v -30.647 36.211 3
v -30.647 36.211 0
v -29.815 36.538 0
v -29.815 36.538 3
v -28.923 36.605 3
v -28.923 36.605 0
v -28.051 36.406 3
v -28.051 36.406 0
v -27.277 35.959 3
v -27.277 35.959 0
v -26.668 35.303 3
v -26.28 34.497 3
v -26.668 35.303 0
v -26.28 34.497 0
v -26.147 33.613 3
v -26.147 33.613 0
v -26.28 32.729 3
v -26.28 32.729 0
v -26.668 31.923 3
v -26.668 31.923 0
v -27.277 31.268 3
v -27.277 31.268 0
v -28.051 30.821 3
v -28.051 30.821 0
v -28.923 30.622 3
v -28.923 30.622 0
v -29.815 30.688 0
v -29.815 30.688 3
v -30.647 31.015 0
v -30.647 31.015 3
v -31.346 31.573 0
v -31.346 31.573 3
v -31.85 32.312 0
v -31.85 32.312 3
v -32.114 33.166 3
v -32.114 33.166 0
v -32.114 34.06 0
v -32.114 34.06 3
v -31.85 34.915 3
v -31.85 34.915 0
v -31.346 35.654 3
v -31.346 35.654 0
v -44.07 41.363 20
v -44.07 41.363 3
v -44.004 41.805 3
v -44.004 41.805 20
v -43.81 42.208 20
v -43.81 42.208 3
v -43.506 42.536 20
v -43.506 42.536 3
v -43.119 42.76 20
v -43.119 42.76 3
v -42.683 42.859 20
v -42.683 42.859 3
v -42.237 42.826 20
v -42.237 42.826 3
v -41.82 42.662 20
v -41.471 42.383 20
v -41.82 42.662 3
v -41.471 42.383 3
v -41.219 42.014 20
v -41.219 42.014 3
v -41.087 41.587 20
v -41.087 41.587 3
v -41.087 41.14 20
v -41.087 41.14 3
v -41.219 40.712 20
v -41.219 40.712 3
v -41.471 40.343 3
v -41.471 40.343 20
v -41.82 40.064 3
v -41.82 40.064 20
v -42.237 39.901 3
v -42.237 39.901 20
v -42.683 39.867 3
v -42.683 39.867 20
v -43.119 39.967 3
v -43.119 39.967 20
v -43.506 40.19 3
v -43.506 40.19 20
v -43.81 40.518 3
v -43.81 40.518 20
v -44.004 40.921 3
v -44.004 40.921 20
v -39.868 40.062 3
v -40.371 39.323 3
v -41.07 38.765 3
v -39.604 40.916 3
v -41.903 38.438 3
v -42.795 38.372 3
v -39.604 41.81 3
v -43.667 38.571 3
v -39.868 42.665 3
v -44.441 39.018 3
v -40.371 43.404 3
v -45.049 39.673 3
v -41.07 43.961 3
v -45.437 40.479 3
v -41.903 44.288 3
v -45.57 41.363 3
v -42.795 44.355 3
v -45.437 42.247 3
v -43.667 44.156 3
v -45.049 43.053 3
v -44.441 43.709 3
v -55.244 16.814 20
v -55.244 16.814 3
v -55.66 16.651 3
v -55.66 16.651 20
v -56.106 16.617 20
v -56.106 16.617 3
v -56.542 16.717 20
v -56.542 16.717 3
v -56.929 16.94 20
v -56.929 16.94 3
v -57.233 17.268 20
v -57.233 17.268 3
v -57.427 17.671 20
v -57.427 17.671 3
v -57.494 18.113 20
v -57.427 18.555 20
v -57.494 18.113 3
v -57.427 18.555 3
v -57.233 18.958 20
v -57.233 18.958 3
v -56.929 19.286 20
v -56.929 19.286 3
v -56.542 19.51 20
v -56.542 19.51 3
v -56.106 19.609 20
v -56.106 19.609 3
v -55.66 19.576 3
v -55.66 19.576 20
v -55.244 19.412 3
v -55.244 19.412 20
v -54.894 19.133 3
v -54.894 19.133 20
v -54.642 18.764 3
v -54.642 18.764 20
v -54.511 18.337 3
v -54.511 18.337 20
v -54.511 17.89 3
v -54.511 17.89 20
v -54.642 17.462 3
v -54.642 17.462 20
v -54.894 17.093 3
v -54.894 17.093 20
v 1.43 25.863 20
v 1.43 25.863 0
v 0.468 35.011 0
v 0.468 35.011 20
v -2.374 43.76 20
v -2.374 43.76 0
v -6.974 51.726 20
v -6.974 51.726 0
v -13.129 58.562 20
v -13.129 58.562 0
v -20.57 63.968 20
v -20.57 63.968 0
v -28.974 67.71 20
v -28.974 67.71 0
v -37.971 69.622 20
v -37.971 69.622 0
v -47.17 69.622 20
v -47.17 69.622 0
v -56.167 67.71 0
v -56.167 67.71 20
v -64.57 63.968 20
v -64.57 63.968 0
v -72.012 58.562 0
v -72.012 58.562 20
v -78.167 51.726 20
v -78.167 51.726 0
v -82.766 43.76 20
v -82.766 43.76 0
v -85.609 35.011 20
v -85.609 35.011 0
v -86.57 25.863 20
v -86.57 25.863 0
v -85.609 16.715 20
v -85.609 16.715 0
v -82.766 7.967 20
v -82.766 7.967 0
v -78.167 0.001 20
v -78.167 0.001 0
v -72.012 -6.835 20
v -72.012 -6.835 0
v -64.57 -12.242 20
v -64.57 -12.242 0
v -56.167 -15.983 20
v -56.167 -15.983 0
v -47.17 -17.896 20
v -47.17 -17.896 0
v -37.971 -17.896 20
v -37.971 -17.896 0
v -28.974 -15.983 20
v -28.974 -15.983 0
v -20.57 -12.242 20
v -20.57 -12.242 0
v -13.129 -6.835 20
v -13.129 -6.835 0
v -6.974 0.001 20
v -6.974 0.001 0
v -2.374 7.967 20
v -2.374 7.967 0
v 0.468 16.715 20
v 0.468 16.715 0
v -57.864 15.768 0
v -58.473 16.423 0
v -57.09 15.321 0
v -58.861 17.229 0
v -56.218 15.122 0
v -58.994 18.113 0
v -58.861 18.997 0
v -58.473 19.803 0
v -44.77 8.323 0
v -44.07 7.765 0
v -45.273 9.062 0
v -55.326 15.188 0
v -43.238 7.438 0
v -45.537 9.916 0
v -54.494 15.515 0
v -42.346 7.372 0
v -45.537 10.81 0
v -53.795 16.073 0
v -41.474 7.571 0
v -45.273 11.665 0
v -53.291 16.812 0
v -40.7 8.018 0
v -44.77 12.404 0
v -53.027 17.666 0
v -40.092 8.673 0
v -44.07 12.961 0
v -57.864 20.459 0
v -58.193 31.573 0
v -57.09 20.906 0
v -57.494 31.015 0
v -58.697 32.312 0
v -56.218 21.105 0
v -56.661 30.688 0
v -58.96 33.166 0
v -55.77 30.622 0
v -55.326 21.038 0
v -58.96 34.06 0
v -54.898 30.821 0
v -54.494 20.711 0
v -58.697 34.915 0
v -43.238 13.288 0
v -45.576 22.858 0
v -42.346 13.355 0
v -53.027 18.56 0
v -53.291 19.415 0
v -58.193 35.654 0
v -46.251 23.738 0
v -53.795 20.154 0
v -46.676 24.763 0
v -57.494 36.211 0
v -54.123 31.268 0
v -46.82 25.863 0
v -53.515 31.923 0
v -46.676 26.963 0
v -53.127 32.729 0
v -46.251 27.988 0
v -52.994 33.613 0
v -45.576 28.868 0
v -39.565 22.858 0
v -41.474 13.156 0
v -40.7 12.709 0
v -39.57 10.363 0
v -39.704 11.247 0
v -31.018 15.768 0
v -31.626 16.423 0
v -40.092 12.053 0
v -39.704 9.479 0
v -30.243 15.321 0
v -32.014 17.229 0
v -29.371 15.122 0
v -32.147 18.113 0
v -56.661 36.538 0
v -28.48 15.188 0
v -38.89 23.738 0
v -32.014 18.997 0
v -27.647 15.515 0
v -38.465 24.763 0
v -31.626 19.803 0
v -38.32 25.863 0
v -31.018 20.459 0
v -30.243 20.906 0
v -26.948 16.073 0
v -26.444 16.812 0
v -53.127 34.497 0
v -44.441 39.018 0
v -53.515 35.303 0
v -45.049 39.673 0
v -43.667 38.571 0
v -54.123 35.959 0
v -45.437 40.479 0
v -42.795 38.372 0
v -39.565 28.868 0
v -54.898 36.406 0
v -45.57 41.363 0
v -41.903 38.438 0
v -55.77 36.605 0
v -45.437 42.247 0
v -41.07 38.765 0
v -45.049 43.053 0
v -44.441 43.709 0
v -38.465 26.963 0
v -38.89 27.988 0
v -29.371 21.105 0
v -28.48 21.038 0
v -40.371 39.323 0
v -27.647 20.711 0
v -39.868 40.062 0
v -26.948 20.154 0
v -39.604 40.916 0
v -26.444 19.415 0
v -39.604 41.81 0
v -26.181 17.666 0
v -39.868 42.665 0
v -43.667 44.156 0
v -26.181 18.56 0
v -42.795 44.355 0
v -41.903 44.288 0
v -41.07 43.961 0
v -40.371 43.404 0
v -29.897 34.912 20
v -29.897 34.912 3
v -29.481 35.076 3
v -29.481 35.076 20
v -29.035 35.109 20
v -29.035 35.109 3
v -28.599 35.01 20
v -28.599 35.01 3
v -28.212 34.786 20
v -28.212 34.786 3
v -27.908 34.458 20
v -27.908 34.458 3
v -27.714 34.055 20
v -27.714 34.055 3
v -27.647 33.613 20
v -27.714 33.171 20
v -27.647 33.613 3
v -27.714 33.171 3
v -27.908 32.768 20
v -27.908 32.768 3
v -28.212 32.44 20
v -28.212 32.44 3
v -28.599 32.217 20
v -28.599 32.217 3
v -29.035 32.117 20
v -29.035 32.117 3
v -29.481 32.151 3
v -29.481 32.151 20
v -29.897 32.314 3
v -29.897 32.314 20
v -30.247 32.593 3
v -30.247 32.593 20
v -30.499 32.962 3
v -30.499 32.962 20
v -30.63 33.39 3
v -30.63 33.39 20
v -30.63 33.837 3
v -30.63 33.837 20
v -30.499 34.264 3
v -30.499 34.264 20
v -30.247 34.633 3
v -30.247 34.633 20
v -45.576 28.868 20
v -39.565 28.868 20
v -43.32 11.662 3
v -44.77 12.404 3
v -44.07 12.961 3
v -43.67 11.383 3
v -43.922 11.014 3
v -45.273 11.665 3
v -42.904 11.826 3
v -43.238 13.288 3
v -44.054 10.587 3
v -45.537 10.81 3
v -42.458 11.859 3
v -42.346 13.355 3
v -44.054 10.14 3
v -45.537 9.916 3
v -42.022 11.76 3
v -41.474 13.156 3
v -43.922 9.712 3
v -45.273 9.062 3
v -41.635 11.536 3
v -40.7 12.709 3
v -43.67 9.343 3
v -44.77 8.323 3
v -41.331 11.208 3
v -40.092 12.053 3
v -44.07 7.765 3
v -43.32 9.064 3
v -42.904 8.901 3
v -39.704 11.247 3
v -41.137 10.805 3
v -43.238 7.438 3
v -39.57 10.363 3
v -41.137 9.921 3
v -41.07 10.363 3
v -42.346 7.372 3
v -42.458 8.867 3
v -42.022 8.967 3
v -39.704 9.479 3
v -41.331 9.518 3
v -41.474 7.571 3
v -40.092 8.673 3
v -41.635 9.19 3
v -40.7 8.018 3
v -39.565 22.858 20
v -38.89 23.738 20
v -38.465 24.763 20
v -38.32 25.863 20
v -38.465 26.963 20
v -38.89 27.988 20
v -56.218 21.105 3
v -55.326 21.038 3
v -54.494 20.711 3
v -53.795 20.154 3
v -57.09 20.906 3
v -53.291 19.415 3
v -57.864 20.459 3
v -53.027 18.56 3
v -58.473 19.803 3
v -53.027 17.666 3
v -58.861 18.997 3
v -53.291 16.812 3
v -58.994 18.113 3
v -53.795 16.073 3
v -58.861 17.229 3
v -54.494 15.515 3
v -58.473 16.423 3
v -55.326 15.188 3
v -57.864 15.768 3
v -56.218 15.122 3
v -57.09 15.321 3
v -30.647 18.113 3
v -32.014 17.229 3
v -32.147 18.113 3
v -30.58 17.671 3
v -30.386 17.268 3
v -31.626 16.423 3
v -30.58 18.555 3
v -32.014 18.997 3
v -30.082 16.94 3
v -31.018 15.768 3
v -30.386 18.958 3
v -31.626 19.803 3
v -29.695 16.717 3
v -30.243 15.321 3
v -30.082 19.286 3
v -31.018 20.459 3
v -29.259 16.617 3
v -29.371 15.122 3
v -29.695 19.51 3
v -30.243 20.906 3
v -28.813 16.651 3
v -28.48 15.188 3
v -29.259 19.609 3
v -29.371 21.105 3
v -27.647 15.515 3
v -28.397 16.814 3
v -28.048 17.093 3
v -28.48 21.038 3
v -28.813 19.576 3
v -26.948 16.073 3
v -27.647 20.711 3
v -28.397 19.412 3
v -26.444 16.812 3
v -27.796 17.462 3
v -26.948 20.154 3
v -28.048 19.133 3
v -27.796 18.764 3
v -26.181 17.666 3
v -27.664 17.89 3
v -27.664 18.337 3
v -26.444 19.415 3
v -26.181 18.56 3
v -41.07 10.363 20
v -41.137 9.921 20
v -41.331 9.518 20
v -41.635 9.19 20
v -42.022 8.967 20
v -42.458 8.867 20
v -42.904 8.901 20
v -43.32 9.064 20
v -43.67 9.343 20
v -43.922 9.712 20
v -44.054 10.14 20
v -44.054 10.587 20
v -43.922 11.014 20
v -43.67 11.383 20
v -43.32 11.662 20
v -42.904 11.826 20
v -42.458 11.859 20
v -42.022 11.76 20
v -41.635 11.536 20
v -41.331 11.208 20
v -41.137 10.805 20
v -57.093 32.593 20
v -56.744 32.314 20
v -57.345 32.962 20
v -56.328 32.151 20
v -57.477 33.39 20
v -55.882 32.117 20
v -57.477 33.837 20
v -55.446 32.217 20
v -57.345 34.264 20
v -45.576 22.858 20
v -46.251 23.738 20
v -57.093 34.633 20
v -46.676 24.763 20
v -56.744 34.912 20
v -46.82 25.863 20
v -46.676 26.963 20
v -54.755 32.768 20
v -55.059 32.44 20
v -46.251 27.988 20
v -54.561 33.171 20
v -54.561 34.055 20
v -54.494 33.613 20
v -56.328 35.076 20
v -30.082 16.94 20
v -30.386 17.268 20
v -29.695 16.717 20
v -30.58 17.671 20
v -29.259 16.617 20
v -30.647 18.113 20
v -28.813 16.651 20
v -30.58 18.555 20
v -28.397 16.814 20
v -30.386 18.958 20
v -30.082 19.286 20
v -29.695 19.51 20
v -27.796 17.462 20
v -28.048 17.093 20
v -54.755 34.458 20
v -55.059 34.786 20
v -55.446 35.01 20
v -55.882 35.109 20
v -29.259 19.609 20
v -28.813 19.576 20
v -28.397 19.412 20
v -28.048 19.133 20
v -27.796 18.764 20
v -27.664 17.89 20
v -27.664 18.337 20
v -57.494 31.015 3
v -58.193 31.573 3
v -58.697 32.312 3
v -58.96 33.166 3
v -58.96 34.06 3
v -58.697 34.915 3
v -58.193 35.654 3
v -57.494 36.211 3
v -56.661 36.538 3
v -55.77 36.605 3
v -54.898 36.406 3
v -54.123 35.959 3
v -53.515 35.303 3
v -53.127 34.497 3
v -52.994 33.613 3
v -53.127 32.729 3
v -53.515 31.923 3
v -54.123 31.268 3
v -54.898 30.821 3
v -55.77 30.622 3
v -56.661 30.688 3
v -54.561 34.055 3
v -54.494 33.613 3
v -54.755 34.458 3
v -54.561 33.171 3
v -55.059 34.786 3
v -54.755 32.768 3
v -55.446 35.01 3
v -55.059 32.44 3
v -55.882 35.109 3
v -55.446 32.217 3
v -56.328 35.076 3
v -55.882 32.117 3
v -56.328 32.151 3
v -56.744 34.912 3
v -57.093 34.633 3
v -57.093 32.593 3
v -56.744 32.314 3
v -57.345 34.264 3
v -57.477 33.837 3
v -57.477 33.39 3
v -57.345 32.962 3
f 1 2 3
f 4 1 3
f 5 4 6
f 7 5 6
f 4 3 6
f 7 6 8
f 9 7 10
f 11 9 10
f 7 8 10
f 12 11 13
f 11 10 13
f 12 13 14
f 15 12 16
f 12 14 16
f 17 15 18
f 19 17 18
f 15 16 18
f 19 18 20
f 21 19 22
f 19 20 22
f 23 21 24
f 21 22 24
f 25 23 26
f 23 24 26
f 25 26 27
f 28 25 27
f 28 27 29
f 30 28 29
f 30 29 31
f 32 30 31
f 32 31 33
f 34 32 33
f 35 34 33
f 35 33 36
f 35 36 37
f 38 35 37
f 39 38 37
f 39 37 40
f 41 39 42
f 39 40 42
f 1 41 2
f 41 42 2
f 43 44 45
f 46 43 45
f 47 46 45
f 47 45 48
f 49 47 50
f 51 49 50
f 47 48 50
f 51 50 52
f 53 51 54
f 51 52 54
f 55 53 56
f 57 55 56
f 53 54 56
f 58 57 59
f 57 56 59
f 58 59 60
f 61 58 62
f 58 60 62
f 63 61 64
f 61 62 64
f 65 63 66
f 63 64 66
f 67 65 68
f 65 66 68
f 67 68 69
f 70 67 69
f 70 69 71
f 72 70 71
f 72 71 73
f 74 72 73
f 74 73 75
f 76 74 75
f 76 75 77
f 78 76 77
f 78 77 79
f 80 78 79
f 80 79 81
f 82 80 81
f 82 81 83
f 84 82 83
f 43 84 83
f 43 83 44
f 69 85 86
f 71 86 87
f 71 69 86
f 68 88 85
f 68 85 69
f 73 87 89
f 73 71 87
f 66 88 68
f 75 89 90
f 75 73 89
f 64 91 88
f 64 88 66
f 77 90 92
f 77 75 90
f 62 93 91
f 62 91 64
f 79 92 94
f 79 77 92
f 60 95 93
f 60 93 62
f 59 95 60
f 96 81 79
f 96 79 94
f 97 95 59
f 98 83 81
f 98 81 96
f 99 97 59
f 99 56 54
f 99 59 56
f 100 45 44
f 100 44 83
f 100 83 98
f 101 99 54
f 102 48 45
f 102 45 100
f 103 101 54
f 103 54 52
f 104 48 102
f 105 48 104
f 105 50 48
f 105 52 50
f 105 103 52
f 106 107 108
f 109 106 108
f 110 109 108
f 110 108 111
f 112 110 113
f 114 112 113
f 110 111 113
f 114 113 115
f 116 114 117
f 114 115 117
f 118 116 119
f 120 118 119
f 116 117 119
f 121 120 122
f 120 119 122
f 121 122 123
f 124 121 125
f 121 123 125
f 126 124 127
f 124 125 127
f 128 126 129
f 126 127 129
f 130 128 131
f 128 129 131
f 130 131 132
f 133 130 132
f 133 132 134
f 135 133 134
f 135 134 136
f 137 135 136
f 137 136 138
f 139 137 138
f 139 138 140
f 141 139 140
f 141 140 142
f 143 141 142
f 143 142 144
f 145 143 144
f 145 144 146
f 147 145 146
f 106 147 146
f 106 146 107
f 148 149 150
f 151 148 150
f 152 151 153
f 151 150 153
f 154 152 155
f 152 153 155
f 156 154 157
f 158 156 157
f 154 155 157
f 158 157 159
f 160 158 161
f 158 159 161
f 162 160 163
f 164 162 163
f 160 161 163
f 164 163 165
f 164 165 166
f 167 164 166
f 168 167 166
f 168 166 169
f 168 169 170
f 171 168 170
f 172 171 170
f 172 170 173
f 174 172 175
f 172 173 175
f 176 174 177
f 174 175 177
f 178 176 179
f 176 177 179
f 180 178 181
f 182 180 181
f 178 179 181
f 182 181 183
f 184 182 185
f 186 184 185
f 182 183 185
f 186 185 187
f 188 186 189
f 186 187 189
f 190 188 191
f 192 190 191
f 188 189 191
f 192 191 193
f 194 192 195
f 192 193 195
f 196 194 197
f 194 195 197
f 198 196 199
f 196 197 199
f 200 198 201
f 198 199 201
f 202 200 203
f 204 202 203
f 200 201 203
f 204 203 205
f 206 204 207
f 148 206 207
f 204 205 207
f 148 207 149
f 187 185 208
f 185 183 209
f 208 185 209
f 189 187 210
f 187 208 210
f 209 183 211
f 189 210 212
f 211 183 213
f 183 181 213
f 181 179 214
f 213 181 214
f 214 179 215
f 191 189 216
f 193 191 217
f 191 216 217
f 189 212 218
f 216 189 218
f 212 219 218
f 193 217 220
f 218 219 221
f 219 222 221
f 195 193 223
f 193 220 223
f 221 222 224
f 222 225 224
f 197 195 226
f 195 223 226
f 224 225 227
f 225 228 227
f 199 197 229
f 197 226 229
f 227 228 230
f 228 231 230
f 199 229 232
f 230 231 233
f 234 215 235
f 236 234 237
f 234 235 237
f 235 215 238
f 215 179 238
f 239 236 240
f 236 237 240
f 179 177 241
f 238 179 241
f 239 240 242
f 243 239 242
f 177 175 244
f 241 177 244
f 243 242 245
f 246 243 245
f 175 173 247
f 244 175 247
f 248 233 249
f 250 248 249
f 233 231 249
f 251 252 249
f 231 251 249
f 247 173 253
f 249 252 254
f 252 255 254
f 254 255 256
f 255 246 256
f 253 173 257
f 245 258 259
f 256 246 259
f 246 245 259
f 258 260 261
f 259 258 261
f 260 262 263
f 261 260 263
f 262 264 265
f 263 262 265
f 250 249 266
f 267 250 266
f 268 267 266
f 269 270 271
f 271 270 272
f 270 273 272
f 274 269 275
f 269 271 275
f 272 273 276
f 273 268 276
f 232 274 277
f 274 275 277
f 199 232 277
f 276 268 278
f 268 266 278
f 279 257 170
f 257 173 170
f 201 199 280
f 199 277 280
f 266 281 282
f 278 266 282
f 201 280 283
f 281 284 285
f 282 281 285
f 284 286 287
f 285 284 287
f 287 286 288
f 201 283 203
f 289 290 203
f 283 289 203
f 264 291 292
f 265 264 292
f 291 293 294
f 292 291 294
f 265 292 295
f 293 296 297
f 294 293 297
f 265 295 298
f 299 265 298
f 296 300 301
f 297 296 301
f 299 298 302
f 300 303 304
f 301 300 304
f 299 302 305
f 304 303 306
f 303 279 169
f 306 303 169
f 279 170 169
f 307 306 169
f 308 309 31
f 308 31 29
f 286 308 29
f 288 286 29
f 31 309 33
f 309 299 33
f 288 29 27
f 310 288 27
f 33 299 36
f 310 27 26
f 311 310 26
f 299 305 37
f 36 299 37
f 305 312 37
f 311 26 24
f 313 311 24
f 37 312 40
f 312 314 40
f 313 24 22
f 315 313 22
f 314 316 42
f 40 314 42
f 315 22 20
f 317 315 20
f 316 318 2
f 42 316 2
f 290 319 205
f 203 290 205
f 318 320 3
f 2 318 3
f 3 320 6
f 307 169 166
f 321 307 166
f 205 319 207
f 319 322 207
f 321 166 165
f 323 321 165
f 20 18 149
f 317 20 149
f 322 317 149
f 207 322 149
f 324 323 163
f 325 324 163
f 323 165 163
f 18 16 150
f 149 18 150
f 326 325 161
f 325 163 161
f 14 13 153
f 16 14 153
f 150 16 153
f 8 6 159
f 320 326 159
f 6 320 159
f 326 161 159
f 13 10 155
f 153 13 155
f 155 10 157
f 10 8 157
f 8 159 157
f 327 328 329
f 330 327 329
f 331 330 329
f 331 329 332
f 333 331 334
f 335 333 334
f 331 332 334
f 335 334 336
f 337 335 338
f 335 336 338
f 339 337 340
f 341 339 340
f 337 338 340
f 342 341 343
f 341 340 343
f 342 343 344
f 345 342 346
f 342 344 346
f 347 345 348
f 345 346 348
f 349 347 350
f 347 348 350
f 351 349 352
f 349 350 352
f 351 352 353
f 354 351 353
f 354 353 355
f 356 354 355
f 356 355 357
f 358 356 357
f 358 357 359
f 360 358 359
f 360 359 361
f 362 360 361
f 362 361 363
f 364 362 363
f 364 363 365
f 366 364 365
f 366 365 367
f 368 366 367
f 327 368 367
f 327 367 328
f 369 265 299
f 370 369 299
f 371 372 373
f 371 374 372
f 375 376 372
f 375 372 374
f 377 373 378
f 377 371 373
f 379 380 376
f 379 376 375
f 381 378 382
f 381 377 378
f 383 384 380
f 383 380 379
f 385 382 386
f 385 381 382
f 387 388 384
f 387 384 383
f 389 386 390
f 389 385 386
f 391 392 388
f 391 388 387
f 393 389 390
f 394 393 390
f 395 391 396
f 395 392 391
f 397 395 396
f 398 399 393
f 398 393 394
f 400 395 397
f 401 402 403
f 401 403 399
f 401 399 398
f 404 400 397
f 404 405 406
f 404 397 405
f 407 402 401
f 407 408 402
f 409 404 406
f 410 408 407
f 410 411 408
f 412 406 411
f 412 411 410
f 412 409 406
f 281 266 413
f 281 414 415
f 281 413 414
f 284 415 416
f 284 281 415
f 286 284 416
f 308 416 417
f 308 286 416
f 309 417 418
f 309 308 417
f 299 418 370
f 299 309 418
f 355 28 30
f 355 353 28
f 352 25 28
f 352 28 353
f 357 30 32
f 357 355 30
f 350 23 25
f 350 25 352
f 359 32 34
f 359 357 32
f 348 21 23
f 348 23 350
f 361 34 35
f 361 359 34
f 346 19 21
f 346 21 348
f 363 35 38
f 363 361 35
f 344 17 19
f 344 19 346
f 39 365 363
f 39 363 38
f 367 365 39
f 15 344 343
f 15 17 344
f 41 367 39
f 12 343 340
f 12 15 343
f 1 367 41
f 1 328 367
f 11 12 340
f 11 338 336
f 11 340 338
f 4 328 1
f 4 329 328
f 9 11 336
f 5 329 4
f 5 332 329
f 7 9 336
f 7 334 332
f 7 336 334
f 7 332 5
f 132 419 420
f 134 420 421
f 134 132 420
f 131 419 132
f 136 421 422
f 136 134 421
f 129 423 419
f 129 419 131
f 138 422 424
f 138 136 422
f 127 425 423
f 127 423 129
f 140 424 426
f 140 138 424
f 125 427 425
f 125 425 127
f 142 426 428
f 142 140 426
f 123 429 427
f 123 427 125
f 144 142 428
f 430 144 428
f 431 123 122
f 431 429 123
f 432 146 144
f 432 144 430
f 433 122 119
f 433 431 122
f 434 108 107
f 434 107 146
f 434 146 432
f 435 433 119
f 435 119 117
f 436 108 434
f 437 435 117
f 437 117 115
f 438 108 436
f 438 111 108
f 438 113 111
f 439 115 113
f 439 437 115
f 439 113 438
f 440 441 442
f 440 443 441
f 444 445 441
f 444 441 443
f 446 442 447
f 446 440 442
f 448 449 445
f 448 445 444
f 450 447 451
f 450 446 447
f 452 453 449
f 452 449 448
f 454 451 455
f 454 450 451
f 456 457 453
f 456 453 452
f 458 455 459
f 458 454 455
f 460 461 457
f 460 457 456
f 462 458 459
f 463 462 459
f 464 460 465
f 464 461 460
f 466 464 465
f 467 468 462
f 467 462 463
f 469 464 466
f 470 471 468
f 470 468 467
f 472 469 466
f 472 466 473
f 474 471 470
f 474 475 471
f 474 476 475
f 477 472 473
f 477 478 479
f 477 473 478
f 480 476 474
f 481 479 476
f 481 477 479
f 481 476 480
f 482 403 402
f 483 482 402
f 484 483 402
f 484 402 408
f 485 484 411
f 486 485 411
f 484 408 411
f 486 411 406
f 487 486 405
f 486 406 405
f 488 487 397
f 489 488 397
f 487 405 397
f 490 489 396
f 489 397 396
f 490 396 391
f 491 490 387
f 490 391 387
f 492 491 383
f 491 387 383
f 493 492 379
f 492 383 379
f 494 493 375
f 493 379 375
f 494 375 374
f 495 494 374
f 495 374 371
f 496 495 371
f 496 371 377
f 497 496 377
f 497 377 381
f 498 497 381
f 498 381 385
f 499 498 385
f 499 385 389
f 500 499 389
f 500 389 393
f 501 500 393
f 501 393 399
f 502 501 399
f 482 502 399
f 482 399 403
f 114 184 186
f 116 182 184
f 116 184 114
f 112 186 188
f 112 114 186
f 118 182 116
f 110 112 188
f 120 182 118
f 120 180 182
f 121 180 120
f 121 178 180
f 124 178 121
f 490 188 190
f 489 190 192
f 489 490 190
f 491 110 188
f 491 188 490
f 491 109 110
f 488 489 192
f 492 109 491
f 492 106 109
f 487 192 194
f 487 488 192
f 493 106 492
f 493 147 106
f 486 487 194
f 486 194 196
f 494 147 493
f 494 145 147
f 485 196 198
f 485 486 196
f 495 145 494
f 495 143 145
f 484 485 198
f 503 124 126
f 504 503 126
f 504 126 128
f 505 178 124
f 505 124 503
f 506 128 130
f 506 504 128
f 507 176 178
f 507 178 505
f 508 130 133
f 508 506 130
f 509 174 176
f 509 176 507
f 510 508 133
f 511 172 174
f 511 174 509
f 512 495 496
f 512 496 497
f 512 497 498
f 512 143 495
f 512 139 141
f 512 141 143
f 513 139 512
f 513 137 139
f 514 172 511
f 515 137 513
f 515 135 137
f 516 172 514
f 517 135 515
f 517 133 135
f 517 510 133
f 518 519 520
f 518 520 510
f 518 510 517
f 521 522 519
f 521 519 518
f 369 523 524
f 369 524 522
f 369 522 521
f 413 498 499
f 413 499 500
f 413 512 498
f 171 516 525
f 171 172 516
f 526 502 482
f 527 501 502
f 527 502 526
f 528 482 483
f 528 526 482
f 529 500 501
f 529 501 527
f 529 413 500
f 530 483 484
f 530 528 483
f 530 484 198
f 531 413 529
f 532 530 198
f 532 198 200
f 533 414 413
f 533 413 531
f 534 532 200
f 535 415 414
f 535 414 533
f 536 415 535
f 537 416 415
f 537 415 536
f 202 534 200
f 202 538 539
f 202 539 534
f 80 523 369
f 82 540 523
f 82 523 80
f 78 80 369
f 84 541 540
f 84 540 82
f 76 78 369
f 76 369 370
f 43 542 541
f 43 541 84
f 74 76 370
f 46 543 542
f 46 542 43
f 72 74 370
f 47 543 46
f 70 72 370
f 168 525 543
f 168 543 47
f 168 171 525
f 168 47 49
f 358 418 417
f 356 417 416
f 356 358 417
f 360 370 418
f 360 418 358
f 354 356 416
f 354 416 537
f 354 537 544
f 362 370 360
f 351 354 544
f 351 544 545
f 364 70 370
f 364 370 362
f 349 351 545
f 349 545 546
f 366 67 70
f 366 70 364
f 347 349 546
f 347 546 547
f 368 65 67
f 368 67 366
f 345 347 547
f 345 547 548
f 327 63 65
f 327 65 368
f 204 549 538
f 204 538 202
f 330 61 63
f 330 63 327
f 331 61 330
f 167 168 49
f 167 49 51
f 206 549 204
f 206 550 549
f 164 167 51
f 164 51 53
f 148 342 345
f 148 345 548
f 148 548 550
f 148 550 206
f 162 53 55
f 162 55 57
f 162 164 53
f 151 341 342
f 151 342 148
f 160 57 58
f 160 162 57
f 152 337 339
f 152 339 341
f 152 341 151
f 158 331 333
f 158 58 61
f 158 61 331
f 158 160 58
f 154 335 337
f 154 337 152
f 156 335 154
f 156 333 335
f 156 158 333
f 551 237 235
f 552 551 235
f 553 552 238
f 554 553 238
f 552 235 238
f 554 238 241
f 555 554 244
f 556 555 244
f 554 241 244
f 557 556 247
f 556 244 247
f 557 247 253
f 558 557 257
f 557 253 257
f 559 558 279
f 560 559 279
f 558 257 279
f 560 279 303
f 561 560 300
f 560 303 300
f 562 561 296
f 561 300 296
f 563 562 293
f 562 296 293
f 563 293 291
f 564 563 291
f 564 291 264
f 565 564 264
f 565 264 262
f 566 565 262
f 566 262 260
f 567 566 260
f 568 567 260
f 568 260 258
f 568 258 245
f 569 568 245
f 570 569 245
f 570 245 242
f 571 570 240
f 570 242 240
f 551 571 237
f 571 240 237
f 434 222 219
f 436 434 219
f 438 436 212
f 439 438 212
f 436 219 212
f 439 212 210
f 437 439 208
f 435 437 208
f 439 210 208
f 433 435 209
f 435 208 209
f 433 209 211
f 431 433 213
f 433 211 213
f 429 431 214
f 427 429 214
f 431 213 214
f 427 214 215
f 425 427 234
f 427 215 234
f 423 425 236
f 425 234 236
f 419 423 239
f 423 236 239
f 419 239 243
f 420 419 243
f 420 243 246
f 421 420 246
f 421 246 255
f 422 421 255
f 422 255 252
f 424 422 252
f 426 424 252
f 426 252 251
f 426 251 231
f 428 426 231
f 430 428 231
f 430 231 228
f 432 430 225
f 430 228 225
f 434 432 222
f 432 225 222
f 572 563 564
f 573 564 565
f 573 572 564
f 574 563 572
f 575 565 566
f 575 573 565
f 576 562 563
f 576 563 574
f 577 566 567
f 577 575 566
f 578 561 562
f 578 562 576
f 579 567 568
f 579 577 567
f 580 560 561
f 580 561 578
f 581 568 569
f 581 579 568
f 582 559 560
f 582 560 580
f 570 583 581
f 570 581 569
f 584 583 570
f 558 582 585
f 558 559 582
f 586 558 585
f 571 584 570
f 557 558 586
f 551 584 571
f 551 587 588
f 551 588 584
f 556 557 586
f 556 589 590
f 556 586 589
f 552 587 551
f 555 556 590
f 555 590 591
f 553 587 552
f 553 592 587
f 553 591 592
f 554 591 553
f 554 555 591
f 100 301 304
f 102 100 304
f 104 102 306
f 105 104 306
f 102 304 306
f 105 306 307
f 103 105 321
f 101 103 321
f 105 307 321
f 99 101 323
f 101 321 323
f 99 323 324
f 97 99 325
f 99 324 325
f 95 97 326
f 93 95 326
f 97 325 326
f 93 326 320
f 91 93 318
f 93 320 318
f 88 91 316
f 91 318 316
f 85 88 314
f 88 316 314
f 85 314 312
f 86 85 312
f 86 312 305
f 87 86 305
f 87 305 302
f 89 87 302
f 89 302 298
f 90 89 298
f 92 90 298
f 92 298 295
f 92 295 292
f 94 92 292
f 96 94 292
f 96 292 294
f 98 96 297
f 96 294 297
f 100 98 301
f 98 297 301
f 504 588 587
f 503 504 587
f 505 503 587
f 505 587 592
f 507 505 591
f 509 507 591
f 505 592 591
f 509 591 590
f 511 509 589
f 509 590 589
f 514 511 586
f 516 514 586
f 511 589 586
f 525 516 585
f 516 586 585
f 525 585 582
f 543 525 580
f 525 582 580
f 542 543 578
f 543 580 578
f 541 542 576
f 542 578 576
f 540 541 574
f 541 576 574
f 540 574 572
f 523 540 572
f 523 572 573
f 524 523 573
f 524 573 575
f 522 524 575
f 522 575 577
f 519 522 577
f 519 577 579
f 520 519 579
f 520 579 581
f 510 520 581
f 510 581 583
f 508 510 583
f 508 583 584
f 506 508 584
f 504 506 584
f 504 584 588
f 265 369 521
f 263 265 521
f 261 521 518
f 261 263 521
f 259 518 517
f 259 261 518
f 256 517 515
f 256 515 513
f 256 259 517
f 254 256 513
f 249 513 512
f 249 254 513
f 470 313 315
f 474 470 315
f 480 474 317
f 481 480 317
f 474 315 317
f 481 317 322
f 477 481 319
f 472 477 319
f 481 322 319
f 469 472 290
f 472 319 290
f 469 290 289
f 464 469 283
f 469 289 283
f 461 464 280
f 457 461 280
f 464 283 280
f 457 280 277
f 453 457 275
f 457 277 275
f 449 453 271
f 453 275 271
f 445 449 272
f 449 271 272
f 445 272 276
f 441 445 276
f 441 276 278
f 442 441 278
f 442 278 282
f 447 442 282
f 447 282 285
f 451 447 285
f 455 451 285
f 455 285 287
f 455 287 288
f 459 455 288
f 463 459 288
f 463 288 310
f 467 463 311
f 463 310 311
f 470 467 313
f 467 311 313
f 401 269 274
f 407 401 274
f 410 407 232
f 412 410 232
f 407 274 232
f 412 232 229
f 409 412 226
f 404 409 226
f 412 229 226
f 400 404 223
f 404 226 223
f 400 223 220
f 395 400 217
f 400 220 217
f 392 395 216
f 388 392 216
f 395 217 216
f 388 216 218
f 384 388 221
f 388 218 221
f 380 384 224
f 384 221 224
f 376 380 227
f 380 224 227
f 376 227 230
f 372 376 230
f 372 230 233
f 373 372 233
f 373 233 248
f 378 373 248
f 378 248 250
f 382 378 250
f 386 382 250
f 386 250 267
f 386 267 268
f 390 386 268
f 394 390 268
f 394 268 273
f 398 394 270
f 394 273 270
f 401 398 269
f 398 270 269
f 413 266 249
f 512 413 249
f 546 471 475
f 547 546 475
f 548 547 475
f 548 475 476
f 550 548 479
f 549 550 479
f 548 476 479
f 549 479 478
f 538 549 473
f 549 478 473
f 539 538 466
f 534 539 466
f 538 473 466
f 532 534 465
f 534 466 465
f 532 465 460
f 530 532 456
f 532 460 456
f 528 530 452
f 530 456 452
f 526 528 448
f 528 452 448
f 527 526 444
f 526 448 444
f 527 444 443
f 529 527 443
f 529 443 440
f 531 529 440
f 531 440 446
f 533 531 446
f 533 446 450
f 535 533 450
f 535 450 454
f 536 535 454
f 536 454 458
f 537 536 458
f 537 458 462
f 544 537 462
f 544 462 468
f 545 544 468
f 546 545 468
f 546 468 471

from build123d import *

# Parameters (mm, degrees)
SKETCH1_R           = 44
BOSS_EXTRUDE1_DEPTH = 20
SKETCH2_R           = 1.5
CUT_EXTRUDE1_DEPTH  = 114.02795241
SKETCH2_3_R         = 3
CUT_EXTRUDE2_DEPTH  = 3
CIRPATTERN1_COUNT   = 6


with BuildPart() as part:
    # Sketch1 → Boss-Extrude1 (new body)
    with BuildSketch(Plane.XY):
        with Locations((-42.570496177, 25.863203603)):
            Circle(SKETCH1_R)
        with BuildLine():
            Line((-39.565292357, 22.857999783), (-45.575699997, 22.857999783))
            ThreePointArc((-45.575699997, 22.857999783), (-46.820496177, 25.863203603), (-45.575699997, 28.868407423))
            Line((-45.575699997, 28.868407423), (-39.565292357, 28.868407423))
            ThreePointArc((-39.565292357, 28.868407423), (-38.320496177, 25.863203603), (-39.565292357, 22.857999783))
        make_face(mode=Mode.SUBTRACT)
    extrude(amount=BOSS_EXTRUDE1_DEPTH)

    # Sketch2 → Cut-Extrude1 (cut, through all)
    with BuildSketch(Plane(origin=(0, 0, 0), x_dir=(-1, 0, 0), z_dir=(0, 0, -1))):
        with Locations((42.570496177, 41.363203603)):
            Circle(SKETCH2_R)
    cut_extrude1 = extrude(amount=-CUT_EXTRUDE1_DEPTH, mode=Mode.SUBTRACT)

    # Sketch2<3> → Cut-Extrude2 (cut)
    with BuildSketch(Plane(origin=(0, 0, 0), x_dir=(-1, 0, 0), z_dir=(0, 0, -1))):
        with Locations((42.570496177, 41.363203603)):
            Circle(SKETCH2_3_R)
    cut_extrude2 = extrude(amount=-CUT_EXTRUDE2_DEPTH, mode=Mode.SUBTRACT)

    # CirPattern1: Cut-Extrude1, Cut-Extrude2 ×6 about axis
    cirpattern1_axis = Axis((-42.570496177, 25.863203603, 20), (0, 0, 1))
    add([cut_extrude1.rotate(cirpattern1_axis, i * 360 / CIRPATTERN1_COUNT) for i in range(1, CIRPATTERN1_COUNT)], mode=Mode.SUBTRACT)
    add([cut_extrude2.rotate(cirpattern1_axis, i * 360 / CIRPATTERN1_COUNT) for i in range(1, CIRPATTERN1_COUNT)], mode=Mode.SUBTRACT)


solid = part.part
